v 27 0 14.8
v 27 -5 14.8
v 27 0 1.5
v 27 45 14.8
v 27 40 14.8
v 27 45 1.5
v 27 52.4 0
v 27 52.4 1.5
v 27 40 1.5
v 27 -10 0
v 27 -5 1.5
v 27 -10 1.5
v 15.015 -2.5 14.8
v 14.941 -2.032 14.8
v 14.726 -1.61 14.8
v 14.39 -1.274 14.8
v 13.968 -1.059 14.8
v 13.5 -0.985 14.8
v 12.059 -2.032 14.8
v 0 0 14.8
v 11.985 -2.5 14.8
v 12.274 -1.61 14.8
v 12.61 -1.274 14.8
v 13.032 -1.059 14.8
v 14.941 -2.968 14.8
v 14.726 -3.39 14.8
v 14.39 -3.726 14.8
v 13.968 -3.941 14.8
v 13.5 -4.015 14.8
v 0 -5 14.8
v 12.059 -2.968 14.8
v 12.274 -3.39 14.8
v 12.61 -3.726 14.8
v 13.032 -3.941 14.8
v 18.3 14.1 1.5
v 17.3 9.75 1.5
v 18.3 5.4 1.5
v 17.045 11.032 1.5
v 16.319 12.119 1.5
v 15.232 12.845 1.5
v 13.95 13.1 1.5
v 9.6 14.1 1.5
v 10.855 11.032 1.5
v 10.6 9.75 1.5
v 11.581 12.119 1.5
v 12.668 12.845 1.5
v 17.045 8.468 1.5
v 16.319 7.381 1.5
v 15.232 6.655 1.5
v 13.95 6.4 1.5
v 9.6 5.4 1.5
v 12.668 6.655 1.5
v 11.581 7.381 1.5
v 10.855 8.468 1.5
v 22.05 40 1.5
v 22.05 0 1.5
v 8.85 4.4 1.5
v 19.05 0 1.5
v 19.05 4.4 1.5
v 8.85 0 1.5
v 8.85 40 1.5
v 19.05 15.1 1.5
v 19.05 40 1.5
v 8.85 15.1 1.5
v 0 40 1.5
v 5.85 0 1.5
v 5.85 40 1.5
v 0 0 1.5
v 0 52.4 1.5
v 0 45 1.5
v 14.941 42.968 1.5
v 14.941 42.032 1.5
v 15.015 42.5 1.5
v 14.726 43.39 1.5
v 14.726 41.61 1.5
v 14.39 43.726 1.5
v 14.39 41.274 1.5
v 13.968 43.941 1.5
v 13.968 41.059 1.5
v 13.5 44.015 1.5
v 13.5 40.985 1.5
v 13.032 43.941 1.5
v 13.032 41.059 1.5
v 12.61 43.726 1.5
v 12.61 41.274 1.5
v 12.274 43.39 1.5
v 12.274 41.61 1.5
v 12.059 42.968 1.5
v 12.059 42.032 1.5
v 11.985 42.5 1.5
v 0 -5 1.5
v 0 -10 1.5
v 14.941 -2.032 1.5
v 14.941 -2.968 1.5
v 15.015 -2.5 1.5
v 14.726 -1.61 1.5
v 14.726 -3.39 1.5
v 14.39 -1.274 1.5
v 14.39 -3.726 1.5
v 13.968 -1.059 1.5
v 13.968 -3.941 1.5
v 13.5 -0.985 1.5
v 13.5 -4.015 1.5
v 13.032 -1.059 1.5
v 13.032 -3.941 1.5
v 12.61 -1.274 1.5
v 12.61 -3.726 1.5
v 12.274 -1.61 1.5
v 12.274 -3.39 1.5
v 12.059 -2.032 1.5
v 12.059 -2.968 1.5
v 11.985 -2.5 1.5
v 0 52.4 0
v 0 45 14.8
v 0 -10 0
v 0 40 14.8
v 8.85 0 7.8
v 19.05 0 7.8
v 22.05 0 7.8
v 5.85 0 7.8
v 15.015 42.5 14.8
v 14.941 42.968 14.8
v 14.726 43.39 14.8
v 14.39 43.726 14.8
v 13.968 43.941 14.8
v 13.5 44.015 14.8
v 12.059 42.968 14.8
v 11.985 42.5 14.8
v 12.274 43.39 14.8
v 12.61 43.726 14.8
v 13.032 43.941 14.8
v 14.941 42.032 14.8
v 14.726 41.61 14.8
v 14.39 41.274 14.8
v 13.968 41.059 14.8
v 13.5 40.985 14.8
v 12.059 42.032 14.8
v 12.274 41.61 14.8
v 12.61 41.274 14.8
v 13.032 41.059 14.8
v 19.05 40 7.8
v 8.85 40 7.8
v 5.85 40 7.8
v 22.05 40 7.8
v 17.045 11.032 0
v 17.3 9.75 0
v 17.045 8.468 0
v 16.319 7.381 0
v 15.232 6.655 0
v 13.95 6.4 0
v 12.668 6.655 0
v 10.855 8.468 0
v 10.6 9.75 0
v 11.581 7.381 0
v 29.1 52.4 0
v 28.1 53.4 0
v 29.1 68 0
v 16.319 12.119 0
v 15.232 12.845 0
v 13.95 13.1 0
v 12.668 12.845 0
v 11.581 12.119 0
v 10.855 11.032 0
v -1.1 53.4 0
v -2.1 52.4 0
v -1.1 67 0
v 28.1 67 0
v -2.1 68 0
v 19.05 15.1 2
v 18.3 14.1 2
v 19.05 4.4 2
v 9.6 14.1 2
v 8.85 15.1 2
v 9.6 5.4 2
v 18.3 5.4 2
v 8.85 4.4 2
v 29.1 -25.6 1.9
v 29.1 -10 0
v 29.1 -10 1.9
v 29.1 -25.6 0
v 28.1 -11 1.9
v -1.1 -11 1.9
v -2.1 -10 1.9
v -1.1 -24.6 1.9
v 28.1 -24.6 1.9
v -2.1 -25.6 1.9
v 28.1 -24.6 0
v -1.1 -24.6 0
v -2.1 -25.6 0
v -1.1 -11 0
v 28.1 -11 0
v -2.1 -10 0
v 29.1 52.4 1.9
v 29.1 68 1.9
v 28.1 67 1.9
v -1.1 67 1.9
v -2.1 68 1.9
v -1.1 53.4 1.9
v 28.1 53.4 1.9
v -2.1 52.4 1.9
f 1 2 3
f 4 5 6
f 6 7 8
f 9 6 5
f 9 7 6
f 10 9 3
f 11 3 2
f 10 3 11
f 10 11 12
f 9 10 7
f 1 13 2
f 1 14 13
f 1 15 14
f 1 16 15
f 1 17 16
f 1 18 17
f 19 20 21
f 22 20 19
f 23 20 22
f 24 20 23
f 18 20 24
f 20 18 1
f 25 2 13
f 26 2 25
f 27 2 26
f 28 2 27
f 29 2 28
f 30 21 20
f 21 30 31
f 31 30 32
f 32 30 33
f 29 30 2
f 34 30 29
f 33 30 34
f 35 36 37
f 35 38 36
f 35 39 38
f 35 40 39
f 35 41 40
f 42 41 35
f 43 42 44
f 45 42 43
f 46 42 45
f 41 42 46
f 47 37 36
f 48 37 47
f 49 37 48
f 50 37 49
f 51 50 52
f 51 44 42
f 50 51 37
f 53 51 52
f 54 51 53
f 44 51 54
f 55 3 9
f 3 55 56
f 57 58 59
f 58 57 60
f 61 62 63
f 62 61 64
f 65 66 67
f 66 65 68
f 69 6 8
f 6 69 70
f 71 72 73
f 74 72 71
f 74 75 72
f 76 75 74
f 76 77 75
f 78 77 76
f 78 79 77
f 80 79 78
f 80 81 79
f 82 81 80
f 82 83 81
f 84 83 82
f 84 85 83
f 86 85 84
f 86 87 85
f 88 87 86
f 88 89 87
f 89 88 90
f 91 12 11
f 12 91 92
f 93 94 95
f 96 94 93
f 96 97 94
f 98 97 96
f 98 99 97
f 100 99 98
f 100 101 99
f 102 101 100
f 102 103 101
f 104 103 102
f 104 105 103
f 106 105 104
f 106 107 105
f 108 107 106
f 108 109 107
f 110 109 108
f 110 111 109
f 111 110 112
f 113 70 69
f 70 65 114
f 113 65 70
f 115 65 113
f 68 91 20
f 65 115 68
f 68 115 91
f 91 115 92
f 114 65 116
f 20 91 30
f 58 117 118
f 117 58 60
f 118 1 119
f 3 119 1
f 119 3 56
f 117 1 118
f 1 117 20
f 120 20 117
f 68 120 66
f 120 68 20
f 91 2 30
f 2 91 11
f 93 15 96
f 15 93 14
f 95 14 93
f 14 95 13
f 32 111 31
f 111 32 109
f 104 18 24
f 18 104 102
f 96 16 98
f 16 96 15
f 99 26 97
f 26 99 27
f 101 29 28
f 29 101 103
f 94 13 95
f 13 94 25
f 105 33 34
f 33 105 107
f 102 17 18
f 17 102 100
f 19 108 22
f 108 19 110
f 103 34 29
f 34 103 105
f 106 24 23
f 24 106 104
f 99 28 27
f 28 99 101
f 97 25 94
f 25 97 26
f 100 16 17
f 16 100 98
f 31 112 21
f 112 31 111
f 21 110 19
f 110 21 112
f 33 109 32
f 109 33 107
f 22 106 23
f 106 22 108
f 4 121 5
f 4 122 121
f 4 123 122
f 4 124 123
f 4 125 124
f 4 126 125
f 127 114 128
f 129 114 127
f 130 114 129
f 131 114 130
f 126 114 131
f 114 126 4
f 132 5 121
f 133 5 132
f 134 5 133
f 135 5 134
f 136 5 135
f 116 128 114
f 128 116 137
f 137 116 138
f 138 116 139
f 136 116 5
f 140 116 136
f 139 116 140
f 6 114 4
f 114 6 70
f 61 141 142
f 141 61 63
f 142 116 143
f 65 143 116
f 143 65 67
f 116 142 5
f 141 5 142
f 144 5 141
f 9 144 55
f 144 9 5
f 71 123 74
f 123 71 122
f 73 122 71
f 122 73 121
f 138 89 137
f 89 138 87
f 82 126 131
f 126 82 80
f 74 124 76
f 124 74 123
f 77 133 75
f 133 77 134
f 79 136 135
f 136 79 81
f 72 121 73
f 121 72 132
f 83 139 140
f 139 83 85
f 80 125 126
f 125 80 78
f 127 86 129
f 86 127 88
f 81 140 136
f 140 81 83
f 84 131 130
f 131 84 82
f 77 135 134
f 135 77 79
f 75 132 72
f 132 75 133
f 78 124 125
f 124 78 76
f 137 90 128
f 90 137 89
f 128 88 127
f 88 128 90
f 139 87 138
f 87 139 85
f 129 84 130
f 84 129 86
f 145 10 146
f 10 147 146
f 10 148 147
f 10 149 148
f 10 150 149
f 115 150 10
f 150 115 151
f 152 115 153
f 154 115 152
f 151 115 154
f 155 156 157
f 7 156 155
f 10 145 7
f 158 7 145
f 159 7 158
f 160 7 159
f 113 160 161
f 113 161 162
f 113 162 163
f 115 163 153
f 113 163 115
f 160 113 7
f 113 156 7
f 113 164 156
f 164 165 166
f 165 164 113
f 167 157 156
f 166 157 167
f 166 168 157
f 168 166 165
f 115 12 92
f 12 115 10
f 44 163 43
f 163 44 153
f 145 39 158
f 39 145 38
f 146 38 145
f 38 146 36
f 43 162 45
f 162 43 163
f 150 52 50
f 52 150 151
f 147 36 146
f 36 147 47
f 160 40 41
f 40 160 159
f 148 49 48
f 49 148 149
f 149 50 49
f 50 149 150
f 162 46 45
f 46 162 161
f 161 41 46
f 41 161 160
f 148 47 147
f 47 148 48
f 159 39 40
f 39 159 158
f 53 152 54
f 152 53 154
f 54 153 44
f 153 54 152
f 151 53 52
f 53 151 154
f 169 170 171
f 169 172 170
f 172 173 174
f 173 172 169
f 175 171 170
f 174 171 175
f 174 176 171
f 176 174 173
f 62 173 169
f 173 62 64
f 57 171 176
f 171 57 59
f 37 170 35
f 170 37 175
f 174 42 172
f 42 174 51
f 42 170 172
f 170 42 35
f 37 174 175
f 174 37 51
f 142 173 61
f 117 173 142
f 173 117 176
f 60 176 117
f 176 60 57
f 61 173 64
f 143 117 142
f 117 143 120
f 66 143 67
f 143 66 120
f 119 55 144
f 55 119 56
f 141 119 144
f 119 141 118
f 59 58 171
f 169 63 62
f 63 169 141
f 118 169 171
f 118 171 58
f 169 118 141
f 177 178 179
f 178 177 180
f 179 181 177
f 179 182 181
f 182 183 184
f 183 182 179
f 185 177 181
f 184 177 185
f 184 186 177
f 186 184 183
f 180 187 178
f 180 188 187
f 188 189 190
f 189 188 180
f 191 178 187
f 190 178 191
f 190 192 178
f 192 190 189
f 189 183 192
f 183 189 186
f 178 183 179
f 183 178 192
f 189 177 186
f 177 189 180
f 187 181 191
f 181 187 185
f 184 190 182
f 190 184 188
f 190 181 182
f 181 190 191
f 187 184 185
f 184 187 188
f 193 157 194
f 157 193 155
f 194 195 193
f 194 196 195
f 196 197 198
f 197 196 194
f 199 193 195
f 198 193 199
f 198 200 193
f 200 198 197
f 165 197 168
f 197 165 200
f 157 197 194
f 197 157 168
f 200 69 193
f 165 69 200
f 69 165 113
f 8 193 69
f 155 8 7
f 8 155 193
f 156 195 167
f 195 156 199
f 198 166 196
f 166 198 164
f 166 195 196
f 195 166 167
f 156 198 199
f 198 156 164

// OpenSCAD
esp_height=19;
esp_width=27;
esp_length=40;
esp_upper_pin_height=5;
esp_upper_pin_length=24;
esp_upper_pin_width=2.6;
esp_upper_pin_margin_x=0.8;
esp_upper_pin_margin_y=3.4;
esp_middle_height=7;
esp_camara_margin_y=5.4;
esp_camara_margin_x=9.6;
esp_camara_width=8.7;
esp_camara_length=8.7;

//esp_camara_heigt = esp_height - esp_upper_pin_height - esp_middle_height; // = 19-5-7 = 7
esp_camara_heigt = 6.3;


bottom_plate_height=1.5;
bottom_plate_width=27;
bottom_plate_length=40;

bottom_height=1.5;
bottom_width=27;
bottom_length=60;


screw_m3_d = 3.03 / 2;
screw_fn = 32;

lego_1=7.8;
lego_stud_height=1.9;
lego_stud_margin=1;


module esp_mock(){

    // pin rows
    translate([esp_upper_pin_margin_x, 0, esp_height - esp_upper_pin_height])
    cube([esp_upper_pin_width, esp_upper_pin_length, esp_upper_pin_height]);
    translate([esp_width - esp_upper_pin_width - esp_upper_pin_margin_x, 0, esp_height - esp_upper_pin_height])
    cube([esp_upper_pin_width, esp_upper_pin_length, esp_upper_pin_height]);

    // main body
    translate([0,0,esp_height - esp_upper_pin_height - esp_middle_height])
    cube([esp_width,esp_length,esp_middle_height]);

    // camera
    translate([esp_camara_margin_x,esp_camara_margin_y,0])
    cube([esp_camara_width,esp_camara_length,esp_height - esp_upper_pin_height - esp_middle_height]);
}


module bottom() {
    module bottom_stand() {


        difference(){
            cube([bottom_plate_width, bottom_plate_length, bottom_plate_height]);
        }

        translate([esp_camara_margin_x-1,esp_camara_margin_y-1,bottom_plate_height]){
            difference(){
                cube([esp_camara_width+2,esp_camara_length+2,0.5]);
                translate([1,1,0])
                cube([esp_camara_width,esp_camara_length,0.5]);
            }
        }

        translate([esp_camara_margin_x-(0.75+3),0,bottom_plate_height])
        cube([3,bottom_plate_length,esp_camara_heigt]);

        translate([esp_camara_margin_x+esp_camara_width + (0.75),0,bottom_plate_height])
        cube([3,bottom_plate_length,esp_camara_heigt]);
    }

    module bottom_rest() {
        translate([0,-10,0])
        cube([bottom_width,bottom_length+3,bottom_height]);


        translate([0,-5,bottom_height]){
            difference(){

                cube([bottom_width,5,esp_camara_heigt+esp_middle_height]);
                translate([bottom_width/2, 2.5, 0])
                cylinder(h=esp_middle_height+esp_camara_heigt, r=screw_m3_d, center=false, $fn=20);
            }

        }

        translate([0,bottom_plate_length,bottom_height]){
            difference(){

                cube([bottom_width,5,esp_camara_heigt+esp_middle_height]);
                translate([bottom_width/2, 2.5, 0])
                cylinder(h=esp_middle_height+esp_camara_heigt, r=screw_m3_d, center=false, $fn=20);
            }
        }

    }

    module lego_holder(){

        difference(){

            cube([4*lego_1,2*lego_1,lego_stud_height]);

            translate([lego_stud_margin, lego_stud_margin, 0])
            cube([4*lego_1 - lego_stud_margin*2,2*lego_1 - lego_stud_margin*2,lego_stud_height]);
        }


    }

    difference(){
        bottom_rest();
        translate([esp_camara_margin_x+esp_camara_length/2, esp_camara_margin_y+esp_camara_length/2, 0])
        cylinder(h=bottom_plate_height+100, r=esp_camara_length/2-1,center=false,$fn=16);
    }
    difference(){
        bottom_stand();
        translate([esp_camara_margin_x+esp_camara_length/2, esp_camara_margin_y+esp_camara_length/2, 0])
        cylinder(h=bottom_plate_height+100, r=esp_camara_length/2-1,center=false,$fn=16);
    }

    translate([(lego_1*4 - bottom_width)/-2, -10-lego_1*2, 0])
    lego_holder();
    translate([(lego_1*4 - bottom_width)/-2, -10-lego_1*2 + lego_1*10, 0])
    lego_holder();
}

module top(){
    difference(){
        translate([(bottom_width-18)/2,-5,0])
        cube([18,esp_length+10,3]);

        translate([(bottom_width)/2,-2.5,0])
        cylinder(h=3, r=screw_m3_d, $fn=20);
        translate([(bottom_width)/2,bottom_plate_length+2.5,0])
        cylinder(h=3, r=screw_m3_d, $fn=20);


    }


}

/*
module base_body(){
    difference(){
        cube([
            screw_extension_width*2 + wall_strength*2 + base_width,
            base_depth,
            base_height + wall_strength*2
        ]);
        
        translate([screw_extension_width + wall_strength, 0, wall_strength]) cube([base_width, base_depth, base_height+wall_strength]);
        cube([screw_extension_width, base_depth, base_height+wall_strength]);
        translate([screw_extension_width + wall_strength*2 + base_width, 0, 0]) cube([screw_extension_width, base_depth, base_height+wall_strength]);
    }
}
*/
//translate([0,0,bottom_plate_height])
//esp_mock();



//translate([0,0,bottom_height+esp_camara_heigt+esp_middle_height])
//top();
bottom();
